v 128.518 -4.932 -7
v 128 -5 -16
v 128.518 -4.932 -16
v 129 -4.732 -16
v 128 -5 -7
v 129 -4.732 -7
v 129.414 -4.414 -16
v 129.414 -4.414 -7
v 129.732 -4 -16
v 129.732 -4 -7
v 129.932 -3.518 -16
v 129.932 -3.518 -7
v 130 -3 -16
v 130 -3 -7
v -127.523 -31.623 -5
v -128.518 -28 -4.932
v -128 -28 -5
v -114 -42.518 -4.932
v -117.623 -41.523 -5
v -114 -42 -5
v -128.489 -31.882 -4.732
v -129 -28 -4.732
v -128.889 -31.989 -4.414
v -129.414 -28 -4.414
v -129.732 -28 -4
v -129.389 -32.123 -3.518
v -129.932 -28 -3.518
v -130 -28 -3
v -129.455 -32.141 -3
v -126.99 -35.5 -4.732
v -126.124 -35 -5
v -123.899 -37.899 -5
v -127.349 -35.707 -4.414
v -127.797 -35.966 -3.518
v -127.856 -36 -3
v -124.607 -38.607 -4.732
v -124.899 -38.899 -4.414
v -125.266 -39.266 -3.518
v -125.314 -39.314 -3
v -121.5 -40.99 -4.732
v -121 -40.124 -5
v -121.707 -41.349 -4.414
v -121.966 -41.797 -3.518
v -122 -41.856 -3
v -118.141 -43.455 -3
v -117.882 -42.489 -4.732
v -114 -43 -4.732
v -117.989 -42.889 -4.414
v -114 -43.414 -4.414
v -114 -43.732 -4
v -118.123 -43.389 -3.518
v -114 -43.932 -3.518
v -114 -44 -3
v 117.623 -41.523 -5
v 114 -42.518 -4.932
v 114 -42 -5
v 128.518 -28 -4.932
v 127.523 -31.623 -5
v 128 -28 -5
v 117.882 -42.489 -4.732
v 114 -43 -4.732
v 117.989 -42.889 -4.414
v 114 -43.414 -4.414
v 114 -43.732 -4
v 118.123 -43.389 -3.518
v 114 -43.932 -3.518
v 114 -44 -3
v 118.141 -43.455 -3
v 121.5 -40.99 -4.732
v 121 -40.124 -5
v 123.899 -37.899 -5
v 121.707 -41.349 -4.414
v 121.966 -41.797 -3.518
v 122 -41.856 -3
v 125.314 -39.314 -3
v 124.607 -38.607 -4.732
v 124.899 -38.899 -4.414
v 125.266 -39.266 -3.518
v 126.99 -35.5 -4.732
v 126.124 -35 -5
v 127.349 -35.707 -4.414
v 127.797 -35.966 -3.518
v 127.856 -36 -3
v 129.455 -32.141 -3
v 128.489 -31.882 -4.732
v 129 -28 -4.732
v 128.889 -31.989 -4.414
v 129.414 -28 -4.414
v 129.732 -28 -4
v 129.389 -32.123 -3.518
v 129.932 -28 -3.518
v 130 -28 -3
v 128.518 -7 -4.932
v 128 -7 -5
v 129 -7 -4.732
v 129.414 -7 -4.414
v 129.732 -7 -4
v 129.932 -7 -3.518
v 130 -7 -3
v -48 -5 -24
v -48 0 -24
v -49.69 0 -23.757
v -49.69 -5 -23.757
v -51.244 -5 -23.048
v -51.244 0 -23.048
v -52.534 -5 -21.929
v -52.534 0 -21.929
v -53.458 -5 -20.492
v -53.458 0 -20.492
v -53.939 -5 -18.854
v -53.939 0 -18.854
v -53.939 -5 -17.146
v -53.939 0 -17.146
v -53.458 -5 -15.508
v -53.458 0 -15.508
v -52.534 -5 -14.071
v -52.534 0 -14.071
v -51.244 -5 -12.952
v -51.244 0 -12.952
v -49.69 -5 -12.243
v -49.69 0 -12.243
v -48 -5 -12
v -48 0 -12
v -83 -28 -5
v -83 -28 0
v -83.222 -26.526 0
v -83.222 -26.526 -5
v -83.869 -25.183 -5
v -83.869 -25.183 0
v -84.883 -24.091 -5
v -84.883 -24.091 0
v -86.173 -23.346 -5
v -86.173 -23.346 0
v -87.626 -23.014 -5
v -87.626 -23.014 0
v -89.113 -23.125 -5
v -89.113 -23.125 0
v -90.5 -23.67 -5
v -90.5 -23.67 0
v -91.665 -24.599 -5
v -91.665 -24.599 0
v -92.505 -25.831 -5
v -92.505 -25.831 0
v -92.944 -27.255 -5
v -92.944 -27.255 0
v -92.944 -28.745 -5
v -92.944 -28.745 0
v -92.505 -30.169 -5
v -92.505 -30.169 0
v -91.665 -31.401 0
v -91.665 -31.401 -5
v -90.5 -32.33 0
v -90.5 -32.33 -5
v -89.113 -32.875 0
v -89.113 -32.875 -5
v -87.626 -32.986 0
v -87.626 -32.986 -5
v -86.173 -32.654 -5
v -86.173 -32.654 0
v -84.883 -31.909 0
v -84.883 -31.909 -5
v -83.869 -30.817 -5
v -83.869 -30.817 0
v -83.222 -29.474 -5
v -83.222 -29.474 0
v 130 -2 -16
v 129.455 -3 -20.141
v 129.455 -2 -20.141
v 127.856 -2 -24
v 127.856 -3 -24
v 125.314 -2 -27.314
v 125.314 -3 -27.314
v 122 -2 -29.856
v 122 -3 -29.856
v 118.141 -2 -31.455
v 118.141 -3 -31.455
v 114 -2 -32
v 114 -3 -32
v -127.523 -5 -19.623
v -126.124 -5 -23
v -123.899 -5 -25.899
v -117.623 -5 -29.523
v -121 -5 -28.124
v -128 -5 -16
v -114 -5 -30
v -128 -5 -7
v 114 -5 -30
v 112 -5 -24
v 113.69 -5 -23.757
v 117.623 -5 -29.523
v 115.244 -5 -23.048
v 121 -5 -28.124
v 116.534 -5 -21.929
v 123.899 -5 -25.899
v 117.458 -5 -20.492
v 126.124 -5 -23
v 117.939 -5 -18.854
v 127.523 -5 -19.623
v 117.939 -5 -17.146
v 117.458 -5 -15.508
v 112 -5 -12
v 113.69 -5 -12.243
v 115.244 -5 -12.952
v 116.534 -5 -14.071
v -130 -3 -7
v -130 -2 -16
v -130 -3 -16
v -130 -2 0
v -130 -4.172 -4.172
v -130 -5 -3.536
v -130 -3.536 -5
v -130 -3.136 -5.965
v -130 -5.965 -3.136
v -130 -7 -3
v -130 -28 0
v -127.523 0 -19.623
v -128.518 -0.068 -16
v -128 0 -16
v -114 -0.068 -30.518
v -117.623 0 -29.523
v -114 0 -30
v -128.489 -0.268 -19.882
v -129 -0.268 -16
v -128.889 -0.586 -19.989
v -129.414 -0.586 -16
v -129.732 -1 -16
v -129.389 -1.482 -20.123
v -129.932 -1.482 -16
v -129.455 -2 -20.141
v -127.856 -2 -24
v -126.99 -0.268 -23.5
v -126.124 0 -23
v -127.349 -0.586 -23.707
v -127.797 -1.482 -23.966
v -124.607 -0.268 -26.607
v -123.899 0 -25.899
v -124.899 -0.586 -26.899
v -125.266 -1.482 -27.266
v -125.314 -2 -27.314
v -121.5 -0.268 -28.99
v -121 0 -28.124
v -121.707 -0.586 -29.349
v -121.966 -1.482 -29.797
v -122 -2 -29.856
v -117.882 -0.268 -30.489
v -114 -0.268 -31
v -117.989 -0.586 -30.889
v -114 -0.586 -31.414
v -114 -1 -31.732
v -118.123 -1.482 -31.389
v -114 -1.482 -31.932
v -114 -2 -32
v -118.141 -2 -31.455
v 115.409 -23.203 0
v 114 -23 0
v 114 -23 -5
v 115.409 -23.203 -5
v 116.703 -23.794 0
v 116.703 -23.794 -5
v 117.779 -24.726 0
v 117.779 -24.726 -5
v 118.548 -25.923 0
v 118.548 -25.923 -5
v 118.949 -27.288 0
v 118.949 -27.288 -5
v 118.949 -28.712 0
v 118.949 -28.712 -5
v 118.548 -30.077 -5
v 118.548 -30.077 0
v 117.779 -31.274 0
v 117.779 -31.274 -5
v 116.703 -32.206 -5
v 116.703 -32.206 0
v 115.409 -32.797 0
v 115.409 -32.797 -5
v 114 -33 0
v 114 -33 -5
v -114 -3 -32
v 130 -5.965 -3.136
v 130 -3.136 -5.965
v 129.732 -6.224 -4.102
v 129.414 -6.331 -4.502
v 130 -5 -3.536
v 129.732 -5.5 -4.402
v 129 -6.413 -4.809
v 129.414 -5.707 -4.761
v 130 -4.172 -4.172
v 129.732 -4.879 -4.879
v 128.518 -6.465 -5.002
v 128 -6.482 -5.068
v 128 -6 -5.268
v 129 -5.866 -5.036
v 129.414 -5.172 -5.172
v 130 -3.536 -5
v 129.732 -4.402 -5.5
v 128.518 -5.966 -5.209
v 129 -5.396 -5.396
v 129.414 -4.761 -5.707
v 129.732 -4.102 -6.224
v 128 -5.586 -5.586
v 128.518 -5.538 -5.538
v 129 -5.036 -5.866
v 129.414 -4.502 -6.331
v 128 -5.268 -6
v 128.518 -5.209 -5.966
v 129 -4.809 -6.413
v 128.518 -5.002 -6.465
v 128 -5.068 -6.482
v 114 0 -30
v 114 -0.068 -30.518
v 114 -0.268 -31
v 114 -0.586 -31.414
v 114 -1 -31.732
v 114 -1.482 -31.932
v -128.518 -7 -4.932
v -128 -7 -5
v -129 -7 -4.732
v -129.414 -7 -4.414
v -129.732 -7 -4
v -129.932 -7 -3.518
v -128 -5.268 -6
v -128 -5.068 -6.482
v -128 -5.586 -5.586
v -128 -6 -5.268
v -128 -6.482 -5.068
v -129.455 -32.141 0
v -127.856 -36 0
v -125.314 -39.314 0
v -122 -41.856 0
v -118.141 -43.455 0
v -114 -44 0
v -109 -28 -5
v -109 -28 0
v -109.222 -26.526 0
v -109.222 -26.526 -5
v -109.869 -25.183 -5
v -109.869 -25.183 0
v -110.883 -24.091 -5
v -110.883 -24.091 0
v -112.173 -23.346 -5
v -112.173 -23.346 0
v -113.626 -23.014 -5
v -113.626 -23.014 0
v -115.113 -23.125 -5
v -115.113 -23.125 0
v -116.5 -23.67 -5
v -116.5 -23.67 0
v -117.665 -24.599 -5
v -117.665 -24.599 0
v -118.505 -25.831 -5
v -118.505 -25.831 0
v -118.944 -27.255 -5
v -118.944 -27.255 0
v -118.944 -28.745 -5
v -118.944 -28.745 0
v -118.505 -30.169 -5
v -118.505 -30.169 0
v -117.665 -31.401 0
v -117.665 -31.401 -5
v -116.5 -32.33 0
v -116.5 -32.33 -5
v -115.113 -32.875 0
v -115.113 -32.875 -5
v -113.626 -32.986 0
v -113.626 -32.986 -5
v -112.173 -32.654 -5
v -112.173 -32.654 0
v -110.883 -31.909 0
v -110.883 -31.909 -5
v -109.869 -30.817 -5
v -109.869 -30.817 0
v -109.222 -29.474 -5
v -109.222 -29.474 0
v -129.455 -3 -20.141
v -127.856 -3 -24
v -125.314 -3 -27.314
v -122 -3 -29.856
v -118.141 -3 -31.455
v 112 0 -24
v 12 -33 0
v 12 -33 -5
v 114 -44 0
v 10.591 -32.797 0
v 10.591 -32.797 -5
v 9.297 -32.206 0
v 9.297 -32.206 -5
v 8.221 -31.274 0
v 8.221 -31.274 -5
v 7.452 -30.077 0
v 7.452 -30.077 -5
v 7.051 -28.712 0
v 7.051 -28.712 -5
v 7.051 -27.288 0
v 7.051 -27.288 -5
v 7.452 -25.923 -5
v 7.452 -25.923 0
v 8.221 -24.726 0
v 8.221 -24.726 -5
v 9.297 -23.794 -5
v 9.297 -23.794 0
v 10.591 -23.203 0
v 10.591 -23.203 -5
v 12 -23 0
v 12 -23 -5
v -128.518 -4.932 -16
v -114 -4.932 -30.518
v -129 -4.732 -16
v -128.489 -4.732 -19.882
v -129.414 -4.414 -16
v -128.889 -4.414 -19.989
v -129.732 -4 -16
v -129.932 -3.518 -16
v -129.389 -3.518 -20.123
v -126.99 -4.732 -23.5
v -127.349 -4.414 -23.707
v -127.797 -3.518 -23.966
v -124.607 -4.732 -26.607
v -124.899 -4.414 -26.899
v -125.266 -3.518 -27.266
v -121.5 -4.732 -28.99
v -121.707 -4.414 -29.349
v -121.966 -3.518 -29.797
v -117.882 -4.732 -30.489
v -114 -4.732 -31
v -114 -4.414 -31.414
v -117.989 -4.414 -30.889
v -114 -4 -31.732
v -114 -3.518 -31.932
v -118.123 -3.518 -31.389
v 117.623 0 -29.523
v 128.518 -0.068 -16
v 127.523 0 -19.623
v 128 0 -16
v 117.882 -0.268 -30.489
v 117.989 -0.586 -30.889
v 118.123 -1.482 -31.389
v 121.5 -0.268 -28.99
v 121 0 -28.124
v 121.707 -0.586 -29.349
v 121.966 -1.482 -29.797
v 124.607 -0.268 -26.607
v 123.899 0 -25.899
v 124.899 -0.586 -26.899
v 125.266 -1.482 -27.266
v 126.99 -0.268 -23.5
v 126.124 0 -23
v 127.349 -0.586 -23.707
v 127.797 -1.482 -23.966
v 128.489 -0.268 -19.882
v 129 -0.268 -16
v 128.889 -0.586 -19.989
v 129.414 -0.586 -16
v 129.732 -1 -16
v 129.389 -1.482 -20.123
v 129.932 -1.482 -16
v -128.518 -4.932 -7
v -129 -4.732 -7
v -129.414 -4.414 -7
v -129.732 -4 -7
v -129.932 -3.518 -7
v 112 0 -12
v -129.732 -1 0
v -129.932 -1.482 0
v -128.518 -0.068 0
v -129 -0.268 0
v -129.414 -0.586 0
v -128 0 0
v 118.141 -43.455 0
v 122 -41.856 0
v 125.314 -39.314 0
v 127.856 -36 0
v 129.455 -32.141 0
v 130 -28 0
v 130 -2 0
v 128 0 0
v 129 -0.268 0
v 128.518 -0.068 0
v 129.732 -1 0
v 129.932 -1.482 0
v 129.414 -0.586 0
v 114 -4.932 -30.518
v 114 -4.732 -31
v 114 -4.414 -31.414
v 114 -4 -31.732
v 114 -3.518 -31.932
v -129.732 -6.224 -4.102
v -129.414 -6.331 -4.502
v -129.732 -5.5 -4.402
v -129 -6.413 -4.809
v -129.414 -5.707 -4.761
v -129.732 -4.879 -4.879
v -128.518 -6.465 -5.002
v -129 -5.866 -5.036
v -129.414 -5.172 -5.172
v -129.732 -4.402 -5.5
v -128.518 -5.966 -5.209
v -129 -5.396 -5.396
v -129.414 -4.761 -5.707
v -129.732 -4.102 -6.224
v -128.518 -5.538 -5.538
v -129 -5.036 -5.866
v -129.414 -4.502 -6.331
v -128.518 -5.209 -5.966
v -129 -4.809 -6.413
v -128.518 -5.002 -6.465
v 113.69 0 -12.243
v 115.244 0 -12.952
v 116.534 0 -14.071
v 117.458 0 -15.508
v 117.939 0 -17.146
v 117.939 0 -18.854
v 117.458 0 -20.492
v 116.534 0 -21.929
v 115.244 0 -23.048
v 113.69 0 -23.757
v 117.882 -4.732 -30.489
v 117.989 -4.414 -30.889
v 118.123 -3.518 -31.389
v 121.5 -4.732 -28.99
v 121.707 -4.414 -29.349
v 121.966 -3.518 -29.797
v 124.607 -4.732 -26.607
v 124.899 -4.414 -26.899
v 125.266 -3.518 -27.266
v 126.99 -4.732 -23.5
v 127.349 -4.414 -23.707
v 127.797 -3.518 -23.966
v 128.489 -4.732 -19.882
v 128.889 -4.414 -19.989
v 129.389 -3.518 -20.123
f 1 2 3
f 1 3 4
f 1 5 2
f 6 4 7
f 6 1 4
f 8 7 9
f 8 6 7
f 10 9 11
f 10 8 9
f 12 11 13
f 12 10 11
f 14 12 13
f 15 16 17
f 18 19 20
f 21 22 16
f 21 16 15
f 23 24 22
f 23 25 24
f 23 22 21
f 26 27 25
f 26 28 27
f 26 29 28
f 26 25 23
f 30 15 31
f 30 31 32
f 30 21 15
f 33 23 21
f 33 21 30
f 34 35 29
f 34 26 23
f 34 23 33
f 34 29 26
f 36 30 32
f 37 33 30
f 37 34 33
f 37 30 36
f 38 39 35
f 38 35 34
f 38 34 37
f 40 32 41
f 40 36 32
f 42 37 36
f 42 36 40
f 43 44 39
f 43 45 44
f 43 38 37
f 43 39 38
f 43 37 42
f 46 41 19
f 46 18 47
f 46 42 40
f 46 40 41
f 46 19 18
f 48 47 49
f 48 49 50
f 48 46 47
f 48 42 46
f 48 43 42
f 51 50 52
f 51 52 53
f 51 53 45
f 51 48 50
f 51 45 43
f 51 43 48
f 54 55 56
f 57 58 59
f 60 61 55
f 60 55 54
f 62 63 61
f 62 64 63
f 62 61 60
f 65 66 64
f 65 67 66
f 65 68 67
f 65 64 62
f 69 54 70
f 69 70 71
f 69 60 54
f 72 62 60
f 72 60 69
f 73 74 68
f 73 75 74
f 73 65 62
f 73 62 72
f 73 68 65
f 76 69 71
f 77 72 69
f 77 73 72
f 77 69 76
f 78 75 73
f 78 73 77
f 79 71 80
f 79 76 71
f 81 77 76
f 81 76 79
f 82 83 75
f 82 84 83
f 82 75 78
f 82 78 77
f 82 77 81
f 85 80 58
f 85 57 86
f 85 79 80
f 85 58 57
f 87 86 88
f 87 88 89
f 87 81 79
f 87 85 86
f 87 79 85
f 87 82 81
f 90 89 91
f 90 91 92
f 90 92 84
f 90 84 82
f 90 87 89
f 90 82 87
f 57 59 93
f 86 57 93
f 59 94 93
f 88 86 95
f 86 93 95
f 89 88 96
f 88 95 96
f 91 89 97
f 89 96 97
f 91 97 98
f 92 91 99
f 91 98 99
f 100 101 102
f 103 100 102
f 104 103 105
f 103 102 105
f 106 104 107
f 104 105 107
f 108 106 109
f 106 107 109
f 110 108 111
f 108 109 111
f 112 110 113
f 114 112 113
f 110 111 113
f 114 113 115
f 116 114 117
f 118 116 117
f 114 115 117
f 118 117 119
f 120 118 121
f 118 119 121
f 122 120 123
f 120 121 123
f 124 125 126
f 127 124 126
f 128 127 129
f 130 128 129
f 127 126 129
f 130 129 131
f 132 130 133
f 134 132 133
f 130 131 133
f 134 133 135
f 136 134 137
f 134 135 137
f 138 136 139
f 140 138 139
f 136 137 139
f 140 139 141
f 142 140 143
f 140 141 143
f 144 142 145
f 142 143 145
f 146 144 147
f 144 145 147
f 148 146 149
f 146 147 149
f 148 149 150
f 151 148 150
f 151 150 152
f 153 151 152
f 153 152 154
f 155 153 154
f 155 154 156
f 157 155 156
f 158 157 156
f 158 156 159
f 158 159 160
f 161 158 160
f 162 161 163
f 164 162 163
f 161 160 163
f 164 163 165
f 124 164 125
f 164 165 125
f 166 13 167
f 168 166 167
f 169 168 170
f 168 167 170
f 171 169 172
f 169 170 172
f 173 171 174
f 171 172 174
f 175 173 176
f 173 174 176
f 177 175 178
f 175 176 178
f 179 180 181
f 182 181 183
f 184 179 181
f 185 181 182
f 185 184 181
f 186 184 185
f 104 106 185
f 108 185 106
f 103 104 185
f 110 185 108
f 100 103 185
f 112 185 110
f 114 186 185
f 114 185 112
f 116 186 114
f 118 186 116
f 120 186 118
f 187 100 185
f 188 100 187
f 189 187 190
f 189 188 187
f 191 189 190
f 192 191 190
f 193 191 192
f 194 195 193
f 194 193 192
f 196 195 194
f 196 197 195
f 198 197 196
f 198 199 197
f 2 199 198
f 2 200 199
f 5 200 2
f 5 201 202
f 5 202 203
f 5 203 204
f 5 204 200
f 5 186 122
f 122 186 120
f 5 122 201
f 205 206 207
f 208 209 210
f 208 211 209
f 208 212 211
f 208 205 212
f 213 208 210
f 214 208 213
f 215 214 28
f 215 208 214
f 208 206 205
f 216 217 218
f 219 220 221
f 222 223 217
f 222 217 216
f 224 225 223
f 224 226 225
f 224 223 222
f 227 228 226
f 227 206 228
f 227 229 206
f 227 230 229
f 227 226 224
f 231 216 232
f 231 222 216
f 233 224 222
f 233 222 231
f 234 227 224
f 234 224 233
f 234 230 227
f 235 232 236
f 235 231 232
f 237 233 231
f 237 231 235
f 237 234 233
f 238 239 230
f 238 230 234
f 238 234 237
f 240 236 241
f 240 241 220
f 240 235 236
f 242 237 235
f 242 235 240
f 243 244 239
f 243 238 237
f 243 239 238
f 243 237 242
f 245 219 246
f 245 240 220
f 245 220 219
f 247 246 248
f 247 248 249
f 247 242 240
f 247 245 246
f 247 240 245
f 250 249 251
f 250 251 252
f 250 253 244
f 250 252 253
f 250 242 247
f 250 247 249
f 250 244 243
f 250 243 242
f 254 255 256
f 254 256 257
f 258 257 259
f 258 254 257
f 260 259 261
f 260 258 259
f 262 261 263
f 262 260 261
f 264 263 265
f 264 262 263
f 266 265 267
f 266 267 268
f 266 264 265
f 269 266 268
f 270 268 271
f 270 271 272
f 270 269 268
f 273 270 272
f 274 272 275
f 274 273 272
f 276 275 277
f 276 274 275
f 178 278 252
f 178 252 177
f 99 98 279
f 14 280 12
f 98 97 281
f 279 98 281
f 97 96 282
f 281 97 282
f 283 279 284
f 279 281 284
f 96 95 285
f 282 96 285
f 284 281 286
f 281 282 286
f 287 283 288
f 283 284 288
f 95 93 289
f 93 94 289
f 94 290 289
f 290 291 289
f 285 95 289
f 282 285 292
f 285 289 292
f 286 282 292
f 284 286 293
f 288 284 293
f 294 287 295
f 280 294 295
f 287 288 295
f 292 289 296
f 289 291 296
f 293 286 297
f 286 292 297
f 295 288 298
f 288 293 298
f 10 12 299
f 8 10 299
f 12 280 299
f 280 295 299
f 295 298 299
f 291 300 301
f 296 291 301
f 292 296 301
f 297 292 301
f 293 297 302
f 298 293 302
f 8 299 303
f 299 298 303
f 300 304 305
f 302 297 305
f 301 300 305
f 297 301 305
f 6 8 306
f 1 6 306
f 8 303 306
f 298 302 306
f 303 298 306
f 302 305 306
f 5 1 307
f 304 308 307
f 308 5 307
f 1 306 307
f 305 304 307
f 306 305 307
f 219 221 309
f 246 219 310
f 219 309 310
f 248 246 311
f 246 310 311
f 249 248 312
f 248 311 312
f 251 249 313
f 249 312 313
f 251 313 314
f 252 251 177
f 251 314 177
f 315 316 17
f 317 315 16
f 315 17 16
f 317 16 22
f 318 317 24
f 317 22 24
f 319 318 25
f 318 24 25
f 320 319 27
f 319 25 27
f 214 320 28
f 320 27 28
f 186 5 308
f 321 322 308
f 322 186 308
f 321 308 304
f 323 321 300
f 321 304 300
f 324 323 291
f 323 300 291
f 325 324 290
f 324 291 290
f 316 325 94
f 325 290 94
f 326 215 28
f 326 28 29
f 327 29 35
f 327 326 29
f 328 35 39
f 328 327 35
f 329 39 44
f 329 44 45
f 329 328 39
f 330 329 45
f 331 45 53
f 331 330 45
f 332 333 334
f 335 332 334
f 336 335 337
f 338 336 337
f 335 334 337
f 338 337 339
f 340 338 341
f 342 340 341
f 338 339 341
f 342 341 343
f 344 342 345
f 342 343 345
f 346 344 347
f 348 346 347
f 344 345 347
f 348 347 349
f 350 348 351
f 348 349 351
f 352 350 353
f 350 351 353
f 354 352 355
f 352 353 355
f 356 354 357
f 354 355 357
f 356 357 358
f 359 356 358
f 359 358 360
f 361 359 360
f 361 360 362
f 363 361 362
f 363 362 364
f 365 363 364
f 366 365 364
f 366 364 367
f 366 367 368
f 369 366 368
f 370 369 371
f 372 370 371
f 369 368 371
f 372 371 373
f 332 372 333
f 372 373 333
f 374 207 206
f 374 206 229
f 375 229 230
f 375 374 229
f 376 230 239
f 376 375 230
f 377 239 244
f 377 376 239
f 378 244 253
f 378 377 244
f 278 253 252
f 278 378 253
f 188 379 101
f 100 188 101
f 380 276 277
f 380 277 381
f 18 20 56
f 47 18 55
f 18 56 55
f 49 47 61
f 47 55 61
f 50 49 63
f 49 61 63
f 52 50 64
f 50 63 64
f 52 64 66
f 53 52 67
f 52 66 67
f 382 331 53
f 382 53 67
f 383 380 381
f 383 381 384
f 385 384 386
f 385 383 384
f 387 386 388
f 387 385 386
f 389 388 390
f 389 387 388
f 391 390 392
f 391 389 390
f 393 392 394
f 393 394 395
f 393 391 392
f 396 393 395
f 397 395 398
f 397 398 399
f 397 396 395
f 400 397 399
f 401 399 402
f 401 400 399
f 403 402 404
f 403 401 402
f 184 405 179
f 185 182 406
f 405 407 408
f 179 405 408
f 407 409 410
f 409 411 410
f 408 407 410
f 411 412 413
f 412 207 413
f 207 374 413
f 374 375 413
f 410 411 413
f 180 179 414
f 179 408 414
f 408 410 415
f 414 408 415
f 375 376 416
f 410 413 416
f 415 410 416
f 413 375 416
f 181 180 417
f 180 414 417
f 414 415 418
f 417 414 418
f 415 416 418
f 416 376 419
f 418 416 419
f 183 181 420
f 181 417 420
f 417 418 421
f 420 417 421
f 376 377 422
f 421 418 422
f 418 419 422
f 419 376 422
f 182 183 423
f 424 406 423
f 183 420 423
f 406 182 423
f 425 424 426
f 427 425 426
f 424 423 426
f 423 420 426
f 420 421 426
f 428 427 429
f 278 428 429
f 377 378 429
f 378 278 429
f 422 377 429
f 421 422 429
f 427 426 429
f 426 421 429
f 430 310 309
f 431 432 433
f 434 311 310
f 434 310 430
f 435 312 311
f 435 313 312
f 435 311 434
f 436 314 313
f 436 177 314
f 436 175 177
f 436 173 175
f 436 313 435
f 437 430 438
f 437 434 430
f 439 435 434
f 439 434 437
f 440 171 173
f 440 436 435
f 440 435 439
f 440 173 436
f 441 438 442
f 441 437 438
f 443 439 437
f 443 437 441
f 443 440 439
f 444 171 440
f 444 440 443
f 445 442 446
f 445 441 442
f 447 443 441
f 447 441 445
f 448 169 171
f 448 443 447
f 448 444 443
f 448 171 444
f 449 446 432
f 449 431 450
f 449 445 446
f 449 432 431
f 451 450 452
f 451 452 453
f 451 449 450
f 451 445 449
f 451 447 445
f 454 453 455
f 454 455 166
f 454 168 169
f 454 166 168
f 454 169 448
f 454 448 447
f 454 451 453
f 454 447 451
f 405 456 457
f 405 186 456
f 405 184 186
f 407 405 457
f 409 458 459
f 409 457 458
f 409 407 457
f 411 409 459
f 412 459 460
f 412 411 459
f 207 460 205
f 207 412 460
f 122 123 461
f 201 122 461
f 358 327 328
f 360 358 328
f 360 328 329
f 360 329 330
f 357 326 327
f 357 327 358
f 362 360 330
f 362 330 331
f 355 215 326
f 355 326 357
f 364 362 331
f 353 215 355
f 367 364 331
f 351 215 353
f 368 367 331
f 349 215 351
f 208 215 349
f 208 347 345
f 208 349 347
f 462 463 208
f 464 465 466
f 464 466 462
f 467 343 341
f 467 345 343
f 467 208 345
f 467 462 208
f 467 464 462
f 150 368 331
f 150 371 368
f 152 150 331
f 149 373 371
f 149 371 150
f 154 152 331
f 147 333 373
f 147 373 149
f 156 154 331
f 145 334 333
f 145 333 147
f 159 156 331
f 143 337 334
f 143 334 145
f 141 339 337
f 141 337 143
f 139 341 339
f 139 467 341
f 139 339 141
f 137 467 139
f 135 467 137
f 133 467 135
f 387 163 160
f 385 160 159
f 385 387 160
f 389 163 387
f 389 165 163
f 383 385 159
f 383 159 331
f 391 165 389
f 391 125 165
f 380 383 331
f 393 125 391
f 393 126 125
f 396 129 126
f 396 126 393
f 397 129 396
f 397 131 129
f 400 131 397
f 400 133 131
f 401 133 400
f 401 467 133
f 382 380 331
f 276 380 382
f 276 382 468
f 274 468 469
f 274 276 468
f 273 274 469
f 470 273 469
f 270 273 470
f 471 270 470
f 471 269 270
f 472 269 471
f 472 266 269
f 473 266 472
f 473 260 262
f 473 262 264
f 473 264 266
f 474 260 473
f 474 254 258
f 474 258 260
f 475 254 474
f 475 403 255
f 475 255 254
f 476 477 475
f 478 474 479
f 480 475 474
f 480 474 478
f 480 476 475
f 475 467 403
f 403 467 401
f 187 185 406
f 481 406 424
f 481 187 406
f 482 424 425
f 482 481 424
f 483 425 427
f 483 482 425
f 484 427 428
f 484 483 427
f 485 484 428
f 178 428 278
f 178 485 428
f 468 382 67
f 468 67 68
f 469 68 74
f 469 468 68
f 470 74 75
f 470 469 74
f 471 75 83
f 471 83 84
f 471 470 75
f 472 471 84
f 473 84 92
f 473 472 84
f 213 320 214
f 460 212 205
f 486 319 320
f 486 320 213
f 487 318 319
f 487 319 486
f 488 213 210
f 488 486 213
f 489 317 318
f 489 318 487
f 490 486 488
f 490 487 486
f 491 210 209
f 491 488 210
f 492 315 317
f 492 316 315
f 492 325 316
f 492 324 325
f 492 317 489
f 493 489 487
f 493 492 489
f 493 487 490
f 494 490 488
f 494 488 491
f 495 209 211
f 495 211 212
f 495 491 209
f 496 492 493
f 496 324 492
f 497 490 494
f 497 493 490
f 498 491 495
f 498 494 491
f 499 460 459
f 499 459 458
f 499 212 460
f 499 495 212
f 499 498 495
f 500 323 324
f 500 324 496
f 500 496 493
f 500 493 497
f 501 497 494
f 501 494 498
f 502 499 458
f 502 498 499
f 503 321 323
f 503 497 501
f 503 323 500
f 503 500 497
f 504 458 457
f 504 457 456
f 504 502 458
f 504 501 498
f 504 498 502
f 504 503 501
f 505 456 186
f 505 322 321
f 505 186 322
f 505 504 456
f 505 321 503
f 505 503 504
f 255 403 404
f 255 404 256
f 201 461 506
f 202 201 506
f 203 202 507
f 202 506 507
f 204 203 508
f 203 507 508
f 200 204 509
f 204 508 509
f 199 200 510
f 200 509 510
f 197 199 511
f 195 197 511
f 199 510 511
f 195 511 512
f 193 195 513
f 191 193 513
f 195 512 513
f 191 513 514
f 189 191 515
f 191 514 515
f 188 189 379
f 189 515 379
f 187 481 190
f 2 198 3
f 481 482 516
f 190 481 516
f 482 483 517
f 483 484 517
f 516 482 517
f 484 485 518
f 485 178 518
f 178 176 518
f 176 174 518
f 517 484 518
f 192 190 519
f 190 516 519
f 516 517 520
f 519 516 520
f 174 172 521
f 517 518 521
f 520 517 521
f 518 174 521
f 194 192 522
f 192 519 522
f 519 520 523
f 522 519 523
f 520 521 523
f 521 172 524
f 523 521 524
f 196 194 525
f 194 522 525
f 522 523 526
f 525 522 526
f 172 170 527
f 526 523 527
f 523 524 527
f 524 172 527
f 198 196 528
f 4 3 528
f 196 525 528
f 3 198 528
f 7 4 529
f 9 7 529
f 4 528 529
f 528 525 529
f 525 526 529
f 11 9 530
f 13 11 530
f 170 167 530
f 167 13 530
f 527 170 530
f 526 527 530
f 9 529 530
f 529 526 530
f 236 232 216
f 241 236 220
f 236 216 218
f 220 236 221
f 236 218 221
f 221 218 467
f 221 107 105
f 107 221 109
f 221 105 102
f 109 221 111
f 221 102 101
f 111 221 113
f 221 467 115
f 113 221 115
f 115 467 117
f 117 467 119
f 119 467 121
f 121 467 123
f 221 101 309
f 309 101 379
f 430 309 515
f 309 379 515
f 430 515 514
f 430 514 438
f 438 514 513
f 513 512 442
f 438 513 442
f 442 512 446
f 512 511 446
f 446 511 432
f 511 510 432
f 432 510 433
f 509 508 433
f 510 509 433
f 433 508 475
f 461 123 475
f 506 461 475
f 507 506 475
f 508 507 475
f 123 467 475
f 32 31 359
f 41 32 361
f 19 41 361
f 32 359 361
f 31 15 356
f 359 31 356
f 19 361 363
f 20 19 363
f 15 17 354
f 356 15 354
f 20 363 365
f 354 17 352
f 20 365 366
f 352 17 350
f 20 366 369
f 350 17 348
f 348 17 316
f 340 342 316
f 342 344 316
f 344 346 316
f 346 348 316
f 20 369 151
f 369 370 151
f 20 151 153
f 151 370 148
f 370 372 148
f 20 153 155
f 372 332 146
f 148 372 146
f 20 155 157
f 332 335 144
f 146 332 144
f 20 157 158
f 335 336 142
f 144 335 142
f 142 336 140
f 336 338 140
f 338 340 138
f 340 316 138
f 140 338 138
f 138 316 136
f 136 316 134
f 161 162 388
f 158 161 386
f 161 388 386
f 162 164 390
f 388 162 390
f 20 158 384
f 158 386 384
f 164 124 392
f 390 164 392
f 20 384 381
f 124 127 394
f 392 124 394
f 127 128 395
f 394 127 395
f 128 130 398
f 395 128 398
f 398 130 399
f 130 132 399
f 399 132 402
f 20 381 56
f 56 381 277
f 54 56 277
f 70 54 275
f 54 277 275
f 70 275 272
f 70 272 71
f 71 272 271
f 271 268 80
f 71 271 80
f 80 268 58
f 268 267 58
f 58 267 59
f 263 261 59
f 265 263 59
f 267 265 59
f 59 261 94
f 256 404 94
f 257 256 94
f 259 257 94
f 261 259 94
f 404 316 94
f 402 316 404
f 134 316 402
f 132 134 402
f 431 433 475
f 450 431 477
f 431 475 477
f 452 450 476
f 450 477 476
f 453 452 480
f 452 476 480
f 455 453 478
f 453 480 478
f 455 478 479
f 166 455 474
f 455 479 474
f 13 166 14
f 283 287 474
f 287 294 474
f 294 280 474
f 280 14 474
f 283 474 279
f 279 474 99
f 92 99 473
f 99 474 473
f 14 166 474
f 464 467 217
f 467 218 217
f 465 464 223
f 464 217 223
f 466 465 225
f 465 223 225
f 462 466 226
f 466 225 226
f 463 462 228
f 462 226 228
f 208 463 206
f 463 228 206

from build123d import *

# Parameters (mm, degrees)
F0_R     = 5
F1_DEPTH = 5
F2_W     = 260
F2_H     = 5
F3_DEPTH = 27
F4_R     = 16
F6_DEPTH = 5
F7_R     = 2


with BuildPart() as f1:
    # F0 (on Top) → F1 (new body)
    with BuildSketch(Plane.XY):
        with BuildLine():
            Line((130, -28), (130, 0))
            Line((130, 0), (-130, 0))
            Line((-130, 0), (-130, -28))
            ThreePointArc((-130, -28), (-125.313708499, -39.313708499), (-114, -44))
            Line((-114, -44), (114, -44))
            ThreePointArc((114, -44), (125.313708499, -39.313708499), (130, -28))
        make_face()
        with Locations((-114, -28)):
            Circle(F0_R, mode=Mode.SUBTRACT)
        with Locations((-88, -28)):
            Circle(F0_R, mode=Mode.SUBTRACT)
        with BuildLine():
            Line((12, -23), (114, -23))
            ThreePointArc((114, -23), (119, -28), (114, -33))
            Line((114, -33), (12, -33))
            ThreePointArc((12, -33), (7, -28), (12, -23))
        make_face(mode=Mode.SUBTRACT)
    extrude(amount=-F1_DEPTH)

    # F2 (on face) → F3 (join)
    with BuildSketch(Plane(origin=(0, 0, -5), x_dir=(1, 0, 0), z_dir=(0, 0, -1))):
        with Locations((0, 2.5)):
            Rectangle(F2_W, F2_H)
    extrude(amount=F3_DEPTH)

    # F4
    f4_edges = [f1.edges().sort_by_distance(p)[0] for p in [
        (130, -2.5, -32),
        (-130, -2.5, -32),
    ]]
    fillet(f4_edges, radius=F4_R)

    # F5 (on face) → F6 (cut)
    with BuildSketch(Plane(origin=(0, 0, 0), x_dir=(-1, 0, 0), z_dir=(0, 1, 0))):
        with BuildLine():
            ThreePointArc((48, -24), (54, -18), (48, -12))
            Line((48, -12), (-112, -12))
            ThreePointArc((-112, -12), (-118, -18), (-112, -24))
            Line((-112, -24), (48, -24))
        make_face()
    extrude(amount=-F6_DEPTH, mode=Mode.SUBTRACT)

    # F7
    f7_edges = [f1.edges().sort_by_distance(p)[0] for p in [
        (0, 0, -32),
        (-125.313708, -5, -27.313708),
        (0, -5, -5),
        (130, -5, -10.5),
        (130, -16.5, -5),
        (130, 0, -8),
        (125.313708, -5, -27.313708),
        (0, -5, -32),
        (-130, -5, -10.5),
        (125.313708, 0, -27.313708),
        (125.313708, -39.313708, -5),
        (0, -44, -5),
        (-125.313708, -39.313708, -5),
        (-130, -16.5, -5),
        (-130, 0, -8),
        (-125.313708, 0, -27.313708),
    ]]
    fillet(f7_edges, radius=F7_R)


solid = f1.part
